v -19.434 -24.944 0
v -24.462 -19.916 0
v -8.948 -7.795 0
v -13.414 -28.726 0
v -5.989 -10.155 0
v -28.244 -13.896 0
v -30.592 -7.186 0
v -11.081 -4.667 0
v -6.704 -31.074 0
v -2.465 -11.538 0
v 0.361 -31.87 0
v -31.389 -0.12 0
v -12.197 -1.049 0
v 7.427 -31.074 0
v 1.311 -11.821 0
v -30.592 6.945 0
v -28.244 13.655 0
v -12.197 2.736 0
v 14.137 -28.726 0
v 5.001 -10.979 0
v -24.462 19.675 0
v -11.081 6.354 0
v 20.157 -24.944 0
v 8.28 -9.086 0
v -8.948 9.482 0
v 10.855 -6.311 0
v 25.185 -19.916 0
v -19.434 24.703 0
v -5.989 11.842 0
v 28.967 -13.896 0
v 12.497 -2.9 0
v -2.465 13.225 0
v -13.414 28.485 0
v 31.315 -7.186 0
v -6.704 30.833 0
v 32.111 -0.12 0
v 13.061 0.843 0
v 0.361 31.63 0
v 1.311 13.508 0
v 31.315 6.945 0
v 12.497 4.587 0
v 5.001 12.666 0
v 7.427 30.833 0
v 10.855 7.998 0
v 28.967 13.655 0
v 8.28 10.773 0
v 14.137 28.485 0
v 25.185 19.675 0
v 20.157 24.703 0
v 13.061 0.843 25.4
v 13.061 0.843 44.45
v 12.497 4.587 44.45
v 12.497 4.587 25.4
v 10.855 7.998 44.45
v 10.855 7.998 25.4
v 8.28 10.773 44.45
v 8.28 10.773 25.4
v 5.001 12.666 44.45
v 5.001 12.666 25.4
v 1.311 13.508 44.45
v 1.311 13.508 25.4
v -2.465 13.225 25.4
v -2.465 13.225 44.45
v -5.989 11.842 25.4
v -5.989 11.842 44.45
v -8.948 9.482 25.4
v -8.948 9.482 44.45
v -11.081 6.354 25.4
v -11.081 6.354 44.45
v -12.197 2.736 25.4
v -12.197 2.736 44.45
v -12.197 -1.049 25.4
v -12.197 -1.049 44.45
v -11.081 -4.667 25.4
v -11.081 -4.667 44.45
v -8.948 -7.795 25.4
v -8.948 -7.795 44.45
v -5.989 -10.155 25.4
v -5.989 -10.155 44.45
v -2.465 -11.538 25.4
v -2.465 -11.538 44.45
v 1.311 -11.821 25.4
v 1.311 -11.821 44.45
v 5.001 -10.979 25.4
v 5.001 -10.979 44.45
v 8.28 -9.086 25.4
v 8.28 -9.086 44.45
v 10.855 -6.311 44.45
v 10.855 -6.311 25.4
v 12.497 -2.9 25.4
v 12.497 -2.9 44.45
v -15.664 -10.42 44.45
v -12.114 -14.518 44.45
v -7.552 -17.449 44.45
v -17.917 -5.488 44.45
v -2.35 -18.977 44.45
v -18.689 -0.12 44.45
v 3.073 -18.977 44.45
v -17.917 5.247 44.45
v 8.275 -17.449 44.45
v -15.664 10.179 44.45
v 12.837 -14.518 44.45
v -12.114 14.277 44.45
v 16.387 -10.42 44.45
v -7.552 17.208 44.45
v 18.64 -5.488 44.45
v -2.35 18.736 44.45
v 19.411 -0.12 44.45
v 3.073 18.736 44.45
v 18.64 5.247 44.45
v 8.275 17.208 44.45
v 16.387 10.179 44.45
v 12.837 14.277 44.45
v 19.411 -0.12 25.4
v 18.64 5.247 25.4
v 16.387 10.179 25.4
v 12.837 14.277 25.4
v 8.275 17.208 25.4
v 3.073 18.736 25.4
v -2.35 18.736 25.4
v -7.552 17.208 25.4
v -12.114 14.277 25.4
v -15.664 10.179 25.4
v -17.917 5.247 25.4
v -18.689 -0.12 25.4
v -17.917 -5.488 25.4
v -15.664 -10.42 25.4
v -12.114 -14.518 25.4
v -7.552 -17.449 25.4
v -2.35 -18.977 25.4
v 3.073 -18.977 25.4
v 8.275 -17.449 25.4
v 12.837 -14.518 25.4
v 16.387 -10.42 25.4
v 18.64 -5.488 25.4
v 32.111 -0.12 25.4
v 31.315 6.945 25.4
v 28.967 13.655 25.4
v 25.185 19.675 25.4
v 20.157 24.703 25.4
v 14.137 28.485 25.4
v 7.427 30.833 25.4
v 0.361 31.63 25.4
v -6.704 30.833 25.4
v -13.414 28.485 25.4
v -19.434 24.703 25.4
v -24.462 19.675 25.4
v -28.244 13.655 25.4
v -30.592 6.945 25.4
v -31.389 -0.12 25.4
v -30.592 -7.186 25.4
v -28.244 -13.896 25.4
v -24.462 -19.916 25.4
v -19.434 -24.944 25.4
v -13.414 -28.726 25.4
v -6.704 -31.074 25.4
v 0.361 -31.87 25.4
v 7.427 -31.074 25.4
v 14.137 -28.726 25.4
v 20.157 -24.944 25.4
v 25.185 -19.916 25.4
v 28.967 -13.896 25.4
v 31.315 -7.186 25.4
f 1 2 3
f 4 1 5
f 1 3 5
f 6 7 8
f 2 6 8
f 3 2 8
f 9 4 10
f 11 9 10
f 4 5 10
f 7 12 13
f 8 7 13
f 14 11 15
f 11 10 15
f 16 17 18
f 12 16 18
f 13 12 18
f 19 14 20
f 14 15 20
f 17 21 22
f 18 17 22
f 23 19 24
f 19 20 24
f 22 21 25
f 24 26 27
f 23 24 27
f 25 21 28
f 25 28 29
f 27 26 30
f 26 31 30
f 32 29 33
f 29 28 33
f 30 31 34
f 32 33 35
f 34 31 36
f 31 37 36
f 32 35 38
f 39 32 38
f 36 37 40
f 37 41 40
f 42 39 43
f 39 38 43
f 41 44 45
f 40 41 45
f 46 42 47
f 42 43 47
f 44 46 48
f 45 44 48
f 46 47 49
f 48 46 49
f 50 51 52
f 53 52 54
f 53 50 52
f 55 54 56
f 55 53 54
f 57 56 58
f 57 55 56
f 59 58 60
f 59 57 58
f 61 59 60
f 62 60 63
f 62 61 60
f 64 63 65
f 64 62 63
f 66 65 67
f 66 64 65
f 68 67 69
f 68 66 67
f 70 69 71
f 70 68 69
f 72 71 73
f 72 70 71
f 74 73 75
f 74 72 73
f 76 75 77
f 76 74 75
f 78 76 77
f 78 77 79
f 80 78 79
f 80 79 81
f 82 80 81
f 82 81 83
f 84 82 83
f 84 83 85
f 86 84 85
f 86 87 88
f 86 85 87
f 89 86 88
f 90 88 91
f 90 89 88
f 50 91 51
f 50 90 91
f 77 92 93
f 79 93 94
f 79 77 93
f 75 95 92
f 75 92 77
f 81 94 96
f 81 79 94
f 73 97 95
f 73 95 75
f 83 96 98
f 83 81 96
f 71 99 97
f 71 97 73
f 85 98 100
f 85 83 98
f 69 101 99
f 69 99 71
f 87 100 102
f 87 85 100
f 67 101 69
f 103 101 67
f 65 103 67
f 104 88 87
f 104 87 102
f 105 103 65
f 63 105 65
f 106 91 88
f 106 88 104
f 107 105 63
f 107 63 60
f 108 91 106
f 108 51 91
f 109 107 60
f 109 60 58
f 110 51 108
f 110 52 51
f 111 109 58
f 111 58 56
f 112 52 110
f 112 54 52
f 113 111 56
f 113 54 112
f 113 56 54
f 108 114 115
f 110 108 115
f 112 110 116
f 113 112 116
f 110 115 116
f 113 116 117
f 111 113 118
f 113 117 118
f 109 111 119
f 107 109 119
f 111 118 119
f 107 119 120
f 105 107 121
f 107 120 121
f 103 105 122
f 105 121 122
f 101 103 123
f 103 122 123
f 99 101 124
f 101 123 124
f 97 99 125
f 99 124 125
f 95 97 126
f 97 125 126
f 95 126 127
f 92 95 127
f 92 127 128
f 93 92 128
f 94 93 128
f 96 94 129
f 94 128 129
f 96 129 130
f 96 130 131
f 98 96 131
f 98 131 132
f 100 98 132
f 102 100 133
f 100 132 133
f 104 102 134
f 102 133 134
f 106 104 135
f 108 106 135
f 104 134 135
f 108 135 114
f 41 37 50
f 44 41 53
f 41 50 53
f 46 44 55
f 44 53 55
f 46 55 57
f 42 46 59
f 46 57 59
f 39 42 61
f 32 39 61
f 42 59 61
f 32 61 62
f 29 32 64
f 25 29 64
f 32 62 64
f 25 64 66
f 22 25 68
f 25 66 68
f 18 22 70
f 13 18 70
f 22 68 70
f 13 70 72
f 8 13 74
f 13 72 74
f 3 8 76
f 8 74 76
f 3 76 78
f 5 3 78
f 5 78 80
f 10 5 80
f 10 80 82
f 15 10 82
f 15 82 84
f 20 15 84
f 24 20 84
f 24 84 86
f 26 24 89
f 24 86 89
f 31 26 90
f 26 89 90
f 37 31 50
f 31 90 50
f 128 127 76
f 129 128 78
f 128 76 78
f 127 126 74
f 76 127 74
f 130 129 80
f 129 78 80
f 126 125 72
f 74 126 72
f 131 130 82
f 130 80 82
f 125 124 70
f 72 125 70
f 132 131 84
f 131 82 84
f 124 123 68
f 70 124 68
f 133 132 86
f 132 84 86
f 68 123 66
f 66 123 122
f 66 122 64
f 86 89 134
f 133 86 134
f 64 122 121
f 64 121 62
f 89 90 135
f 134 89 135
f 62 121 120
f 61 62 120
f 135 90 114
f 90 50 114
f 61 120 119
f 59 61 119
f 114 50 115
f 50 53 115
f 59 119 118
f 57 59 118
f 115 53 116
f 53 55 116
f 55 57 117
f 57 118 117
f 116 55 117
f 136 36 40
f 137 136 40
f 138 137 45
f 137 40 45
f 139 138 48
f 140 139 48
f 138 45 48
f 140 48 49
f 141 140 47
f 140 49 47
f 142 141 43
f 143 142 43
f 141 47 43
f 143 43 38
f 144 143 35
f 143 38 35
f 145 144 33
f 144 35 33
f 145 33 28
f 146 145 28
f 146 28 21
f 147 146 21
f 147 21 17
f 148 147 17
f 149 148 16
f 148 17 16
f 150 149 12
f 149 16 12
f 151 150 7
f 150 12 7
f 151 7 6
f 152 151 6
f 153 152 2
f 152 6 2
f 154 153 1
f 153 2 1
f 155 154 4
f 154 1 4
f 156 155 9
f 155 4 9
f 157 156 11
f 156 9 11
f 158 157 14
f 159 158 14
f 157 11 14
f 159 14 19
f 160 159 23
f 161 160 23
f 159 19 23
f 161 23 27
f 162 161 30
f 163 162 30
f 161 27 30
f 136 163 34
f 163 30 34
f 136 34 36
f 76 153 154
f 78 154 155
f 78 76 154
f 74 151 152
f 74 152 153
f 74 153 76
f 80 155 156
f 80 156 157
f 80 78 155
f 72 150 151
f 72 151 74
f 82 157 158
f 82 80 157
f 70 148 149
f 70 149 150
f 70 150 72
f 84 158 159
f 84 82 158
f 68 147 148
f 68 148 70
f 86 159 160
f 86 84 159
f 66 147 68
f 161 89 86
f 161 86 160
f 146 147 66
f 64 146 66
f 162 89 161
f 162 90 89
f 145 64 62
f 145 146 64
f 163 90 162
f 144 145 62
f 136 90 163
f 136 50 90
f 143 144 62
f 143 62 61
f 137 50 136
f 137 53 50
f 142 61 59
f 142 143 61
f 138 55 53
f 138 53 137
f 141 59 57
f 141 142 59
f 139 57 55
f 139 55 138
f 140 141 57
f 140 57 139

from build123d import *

# Parameters (mm, degrees)
F0_R     = 31.75
F1_DEPTH = 25.4
F2_R     = 19.05
F3_DEPTH = 19.05
F4_R     = 12.7
F5_DEPTH = 25.4
F6_DEPTH = 25.4


with BuildPart() as f1:
    # F0 (on Top) → F1 (new body)
    with BuildSketch(Plane.XY):
        with Locations((0.361489, -0.120497)):
            Circle(F0_R)
    extrude(amount=F1_DEPTH)

    # F4 (on face) → F5 (cut)
    with BuildSketch(Plane.XY.offset(25.4)):
        with Locations((0.361492, 0.843479)):
            Circle(F4_R)
    extrude(amount=-F5_DEPTH, mode=Mode.SUBTRACT)


with BuildPart() as f3:
    # F2 (on face) → F3 (new body)
    with BuildSketch(Plane.XY.offset(25.4)):
        with Locations((0.361489, -0.120497)):
            Circle(F2_R)
    extrude(amount=F3_DEPTH)

    # F4 (on face) → F6 (cut)
    with BuildSketch(Plane.XY.offset(25.4)):
        with Locations((0.361492, 0.843479)):
            Circle(F4_R)
    extrude(amount=F6_DEPTH, mode=Mode.SUBTRACT)


solid = Compound([f1.part, f3.part])
